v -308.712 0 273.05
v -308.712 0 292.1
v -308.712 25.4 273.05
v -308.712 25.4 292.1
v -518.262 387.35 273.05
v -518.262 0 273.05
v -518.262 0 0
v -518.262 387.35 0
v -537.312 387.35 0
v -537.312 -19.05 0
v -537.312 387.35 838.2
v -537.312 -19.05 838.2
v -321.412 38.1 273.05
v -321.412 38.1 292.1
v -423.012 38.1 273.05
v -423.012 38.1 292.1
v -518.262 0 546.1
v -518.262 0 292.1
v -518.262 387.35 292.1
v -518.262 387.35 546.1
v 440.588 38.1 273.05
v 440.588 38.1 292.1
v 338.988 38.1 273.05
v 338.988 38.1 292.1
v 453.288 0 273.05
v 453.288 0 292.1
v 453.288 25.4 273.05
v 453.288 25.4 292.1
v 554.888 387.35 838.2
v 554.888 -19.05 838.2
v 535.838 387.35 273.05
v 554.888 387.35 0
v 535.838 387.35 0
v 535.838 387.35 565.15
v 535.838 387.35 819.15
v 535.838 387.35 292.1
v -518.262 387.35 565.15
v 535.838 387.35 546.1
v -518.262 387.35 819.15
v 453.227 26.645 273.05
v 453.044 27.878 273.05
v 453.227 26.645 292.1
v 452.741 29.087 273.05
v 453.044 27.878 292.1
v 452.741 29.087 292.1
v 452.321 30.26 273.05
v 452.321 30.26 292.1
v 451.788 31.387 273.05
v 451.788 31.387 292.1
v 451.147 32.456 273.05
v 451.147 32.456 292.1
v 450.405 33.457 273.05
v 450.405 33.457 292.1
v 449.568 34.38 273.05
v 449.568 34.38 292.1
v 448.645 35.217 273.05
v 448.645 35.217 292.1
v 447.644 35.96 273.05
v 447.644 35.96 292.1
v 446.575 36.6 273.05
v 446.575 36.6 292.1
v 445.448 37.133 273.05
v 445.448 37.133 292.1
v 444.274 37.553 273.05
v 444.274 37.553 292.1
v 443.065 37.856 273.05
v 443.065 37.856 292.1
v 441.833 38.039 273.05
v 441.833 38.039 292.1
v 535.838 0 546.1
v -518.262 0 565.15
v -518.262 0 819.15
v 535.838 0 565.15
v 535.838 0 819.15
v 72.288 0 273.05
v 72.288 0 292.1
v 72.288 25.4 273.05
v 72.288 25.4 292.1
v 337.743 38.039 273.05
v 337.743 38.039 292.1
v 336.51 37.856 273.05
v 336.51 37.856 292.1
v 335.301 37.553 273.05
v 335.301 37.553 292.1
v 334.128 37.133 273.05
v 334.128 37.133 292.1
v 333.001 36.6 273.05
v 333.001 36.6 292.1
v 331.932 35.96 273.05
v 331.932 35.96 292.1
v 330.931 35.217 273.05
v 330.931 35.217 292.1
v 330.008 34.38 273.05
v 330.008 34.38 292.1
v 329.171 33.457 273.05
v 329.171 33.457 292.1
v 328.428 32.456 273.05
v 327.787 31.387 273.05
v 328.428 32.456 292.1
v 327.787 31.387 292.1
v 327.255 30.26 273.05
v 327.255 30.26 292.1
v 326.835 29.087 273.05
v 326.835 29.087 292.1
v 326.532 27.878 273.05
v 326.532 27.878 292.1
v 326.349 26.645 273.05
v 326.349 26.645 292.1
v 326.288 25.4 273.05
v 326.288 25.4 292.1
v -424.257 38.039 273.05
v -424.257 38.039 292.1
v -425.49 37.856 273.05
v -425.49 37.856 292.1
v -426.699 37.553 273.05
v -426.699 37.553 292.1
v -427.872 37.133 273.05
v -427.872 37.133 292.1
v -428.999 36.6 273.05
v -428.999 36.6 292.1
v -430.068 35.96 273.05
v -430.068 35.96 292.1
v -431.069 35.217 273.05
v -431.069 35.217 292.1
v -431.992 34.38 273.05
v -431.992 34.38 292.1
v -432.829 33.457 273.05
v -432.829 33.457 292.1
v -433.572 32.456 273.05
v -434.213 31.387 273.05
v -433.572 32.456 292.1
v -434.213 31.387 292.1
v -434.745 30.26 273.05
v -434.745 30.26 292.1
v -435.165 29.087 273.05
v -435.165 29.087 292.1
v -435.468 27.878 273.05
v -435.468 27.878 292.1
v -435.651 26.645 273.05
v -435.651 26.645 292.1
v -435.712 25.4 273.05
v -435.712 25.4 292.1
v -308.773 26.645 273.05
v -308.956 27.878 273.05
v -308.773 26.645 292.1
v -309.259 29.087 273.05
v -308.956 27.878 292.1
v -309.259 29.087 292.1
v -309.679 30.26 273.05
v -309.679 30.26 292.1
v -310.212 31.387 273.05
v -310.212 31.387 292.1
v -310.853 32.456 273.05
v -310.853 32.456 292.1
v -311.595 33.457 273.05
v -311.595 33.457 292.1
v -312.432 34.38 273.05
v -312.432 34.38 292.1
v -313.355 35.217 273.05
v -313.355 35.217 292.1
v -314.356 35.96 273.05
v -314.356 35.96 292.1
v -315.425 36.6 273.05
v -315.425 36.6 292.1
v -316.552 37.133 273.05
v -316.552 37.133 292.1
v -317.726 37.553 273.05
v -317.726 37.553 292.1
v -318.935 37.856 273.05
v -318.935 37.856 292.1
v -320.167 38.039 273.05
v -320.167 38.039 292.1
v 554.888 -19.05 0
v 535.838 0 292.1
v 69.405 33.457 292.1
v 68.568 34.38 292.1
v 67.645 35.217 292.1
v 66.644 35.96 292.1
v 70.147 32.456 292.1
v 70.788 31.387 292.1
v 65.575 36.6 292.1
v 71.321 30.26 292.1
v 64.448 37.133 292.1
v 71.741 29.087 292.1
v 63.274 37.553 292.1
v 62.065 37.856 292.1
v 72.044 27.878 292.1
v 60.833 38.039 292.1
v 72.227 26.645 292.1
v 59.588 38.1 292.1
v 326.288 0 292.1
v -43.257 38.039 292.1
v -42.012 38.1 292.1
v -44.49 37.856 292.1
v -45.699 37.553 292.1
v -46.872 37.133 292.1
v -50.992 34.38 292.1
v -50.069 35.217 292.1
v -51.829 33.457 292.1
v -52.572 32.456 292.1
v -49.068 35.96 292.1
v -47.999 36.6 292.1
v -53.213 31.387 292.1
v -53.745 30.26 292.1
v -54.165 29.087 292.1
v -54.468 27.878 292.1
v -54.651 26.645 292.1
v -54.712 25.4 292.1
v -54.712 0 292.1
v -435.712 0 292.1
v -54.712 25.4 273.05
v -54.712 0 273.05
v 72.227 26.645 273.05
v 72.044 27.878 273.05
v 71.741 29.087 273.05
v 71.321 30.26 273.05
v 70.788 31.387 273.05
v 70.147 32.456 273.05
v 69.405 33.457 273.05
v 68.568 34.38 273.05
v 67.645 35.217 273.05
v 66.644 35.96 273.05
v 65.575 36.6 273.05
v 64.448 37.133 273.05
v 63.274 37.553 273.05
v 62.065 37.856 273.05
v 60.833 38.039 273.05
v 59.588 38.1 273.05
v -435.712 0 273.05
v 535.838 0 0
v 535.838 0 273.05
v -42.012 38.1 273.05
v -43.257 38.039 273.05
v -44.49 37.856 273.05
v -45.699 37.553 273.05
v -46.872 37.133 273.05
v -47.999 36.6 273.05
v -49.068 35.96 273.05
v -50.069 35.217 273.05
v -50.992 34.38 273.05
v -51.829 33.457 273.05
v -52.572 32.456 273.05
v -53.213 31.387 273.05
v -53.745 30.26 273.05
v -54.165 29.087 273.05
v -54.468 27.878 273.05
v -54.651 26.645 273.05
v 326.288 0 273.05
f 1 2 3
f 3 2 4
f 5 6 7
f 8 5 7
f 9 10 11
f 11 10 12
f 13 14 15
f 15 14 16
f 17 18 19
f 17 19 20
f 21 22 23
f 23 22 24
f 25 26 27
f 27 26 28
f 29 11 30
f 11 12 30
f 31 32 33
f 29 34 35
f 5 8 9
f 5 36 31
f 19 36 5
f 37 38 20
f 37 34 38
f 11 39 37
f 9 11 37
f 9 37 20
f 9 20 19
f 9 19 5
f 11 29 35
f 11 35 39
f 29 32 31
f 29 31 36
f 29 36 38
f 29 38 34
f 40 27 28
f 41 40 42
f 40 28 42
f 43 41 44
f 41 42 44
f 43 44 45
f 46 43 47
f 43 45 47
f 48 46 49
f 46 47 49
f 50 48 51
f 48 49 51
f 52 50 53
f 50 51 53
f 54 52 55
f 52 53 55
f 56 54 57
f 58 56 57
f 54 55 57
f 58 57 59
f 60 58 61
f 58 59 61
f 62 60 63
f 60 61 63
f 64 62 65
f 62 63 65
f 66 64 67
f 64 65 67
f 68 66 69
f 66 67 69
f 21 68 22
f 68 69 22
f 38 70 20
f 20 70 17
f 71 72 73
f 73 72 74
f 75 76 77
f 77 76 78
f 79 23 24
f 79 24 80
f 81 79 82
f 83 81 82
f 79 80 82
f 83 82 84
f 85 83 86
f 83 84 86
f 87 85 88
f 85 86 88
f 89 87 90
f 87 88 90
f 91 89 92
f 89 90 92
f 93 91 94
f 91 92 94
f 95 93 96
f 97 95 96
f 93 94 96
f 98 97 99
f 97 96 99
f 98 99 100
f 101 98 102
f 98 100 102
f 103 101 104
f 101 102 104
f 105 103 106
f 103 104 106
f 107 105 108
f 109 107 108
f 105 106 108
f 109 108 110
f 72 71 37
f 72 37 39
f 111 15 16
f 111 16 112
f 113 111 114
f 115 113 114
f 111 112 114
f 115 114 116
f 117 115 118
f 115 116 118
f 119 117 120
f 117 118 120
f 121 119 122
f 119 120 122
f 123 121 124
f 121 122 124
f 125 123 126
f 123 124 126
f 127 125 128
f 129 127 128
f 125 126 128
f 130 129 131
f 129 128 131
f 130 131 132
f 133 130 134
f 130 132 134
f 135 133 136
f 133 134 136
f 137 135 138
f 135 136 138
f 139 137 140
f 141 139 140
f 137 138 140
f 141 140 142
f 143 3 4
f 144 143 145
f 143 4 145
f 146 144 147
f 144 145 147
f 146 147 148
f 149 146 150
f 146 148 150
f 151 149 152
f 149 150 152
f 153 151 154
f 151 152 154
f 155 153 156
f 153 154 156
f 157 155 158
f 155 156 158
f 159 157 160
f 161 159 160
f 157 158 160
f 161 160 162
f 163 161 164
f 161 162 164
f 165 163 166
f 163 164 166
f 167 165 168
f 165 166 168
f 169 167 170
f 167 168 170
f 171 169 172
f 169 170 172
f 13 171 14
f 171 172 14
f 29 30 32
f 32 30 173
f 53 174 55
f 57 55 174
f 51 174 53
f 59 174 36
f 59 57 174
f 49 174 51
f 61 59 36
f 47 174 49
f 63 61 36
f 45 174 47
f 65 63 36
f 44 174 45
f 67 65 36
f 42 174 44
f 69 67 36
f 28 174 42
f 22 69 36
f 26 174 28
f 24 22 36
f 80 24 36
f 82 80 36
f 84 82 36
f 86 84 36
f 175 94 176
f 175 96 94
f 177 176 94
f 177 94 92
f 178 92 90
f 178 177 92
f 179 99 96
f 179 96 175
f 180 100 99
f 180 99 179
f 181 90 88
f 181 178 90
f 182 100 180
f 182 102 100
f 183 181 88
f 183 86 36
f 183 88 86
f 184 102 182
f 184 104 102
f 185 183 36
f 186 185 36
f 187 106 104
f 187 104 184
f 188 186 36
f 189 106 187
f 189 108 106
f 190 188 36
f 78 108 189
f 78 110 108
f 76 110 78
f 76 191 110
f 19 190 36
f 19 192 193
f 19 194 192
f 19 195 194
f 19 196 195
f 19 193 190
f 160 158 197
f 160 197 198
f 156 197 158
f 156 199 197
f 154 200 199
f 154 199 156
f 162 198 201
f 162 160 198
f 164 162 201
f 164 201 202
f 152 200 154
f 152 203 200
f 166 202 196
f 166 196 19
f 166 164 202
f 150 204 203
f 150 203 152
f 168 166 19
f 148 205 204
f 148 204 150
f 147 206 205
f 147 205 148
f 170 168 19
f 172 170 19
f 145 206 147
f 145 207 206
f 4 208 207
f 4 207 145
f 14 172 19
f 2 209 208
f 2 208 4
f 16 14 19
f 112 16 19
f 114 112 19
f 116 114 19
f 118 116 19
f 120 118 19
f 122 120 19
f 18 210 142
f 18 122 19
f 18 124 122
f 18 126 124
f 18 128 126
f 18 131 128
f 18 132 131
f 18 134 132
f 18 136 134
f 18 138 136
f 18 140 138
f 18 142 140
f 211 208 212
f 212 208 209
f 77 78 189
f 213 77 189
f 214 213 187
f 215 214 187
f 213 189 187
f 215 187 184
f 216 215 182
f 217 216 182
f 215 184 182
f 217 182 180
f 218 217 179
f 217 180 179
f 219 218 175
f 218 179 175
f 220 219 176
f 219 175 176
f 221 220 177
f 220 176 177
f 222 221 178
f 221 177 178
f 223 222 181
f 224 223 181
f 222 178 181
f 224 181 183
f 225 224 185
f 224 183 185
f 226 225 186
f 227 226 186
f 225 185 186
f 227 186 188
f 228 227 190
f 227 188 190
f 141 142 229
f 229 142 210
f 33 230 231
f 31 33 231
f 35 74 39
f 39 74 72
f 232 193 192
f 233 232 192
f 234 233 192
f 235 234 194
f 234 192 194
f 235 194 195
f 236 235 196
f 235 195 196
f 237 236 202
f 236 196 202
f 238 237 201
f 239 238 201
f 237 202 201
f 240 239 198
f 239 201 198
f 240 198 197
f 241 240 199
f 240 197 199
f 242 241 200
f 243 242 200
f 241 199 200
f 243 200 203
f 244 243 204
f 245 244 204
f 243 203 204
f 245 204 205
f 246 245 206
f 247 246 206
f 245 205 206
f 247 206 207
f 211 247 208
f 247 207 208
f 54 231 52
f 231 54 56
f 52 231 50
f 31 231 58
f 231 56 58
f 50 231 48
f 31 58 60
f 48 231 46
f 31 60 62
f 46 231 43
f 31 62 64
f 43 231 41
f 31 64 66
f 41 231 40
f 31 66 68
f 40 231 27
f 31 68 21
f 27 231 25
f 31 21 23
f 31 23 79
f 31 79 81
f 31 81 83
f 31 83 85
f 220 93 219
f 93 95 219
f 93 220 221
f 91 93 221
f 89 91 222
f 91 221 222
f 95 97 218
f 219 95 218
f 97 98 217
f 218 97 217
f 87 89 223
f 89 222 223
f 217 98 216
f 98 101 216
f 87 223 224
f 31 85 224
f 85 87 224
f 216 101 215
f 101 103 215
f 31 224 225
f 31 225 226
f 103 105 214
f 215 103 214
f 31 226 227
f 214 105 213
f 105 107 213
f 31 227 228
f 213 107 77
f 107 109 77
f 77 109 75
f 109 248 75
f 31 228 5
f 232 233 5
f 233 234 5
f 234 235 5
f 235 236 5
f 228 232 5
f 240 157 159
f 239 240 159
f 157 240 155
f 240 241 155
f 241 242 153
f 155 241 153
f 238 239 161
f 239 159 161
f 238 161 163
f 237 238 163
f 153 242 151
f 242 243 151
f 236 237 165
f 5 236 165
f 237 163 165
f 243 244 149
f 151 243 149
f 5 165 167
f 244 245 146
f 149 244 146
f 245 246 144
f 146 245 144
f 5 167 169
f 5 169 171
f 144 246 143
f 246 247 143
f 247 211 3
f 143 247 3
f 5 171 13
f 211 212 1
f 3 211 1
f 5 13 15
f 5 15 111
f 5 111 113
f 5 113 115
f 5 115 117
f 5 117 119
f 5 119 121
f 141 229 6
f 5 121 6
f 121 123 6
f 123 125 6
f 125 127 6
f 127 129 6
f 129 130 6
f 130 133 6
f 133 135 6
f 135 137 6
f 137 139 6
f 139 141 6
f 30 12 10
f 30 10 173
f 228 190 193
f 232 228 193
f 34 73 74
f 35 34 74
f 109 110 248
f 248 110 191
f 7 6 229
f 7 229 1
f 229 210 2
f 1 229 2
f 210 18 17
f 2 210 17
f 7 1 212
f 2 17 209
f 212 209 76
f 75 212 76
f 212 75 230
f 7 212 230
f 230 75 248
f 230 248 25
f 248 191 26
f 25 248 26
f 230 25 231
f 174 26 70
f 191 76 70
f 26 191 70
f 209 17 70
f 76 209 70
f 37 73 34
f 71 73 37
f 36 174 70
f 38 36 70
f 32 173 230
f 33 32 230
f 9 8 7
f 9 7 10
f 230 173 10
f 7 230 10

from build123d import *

# Parameters (mm, degrees)
F0_W     = 1092.2
F0_H     = 838.2
F1_DEPTH = 19.05
F2_W     = 1054.1
F2_H     = 254
F3_DEPTH = 387.35
F5_DEPTH = 19.05


with BuildPart() as f1:
    # F0 (on Front) → F1 (new body)
    with BuildSketch(Plane.XZ):
        with Locations((8.787813, 419.1)):
            Rectangle(F0_W, F0_H)
    extrude(amount=F1_DEPTH)

    # F2 (on face) → F3 (join)
    with BuildSketch(Plane(origin=(0, 0, 0), x_dir=(-1, 0, 0), z_dir=(0, 1, 0))):
        Polygon((537.312187, 0), (537.312187, 838.2), (518.262187, 838.2), (-535.837813, 838.2), (-554.887813, 838.2), (-554.887813, 0), (-535.837813, 0), (-535.837813, 273.05), (518.262187, 273.05), (518.262187, 0), align=None)
        with Locations((-8.787813, 419.1)):
            Rectangle(F2_W, F2_H, mode=Mode.SUBTRACT)
        with Locations((-8.787813, 692.15)):
            Rectangle(F2_W, F2_H, mode=Mode.SUBTRACT)
    extrude(amount=F3_DEPTH)

    # F4 (on face) → F5 (cut)
    with BuildSketch(Plane.XY.offset(292.1)):
        with BuildLine():
            Line((-435.712187, 25.4), (-435.712187, 0))
            Line((-435.712187, 0), (-308.712187, 0))
            Line((-308.712187, 0), (-308.712187, 25.4))
            ThreePointArc((-308.712187, 25.4), (-312.431931, 34.380256), (-321.412187, 38.1))
            Line((-321.412187, 38.1), (-423.012187, 38.1))
            ThreePointArc((-423.012187, 38.1), (-431.992444, 34.380256), (-435.712187, 25.4))
        make_face()
        with BuildLine():
            Line((-54.712187, 25.4), (-54.712187, 0))
            Line((-54.712187, 0), (72.287813, 0))
            Line((72.287813, 0), (72.287813, 25.4))
            ThreePointArc((72.287813, 25.4), (68.568069, 34.380256), (59.587813, 38.1))
            Line((59.587813, 38.1), (-42.012187, 38.1))
            ThreePointArc((-42.012187, 38.1), (-50.992444, 34.380256), (-54.712187, 25.4))
        make_face()
        with BuildLine():
            Line((326.287813, 25.4), (326.287813, 0))
            Line((326.287813, 0), (453.287813, 0))
            Line((453.287813, 0), (453.287813, 25.4))
            ThreePointArc((453.287813, 25.4), (449.568069, 34.380256), (440.587813, 38.1))
            Line((440.587813, 38.1), (338.987813, 38.1))
            ThreePointArc((338.987813, 38.1), (330.007556, 34.380256), (326.287813, 25.4))
        make_face()
    extrude(amount=-F5_DEPTH, mode=Mode.SUBTRACT)


solid = f1.part
